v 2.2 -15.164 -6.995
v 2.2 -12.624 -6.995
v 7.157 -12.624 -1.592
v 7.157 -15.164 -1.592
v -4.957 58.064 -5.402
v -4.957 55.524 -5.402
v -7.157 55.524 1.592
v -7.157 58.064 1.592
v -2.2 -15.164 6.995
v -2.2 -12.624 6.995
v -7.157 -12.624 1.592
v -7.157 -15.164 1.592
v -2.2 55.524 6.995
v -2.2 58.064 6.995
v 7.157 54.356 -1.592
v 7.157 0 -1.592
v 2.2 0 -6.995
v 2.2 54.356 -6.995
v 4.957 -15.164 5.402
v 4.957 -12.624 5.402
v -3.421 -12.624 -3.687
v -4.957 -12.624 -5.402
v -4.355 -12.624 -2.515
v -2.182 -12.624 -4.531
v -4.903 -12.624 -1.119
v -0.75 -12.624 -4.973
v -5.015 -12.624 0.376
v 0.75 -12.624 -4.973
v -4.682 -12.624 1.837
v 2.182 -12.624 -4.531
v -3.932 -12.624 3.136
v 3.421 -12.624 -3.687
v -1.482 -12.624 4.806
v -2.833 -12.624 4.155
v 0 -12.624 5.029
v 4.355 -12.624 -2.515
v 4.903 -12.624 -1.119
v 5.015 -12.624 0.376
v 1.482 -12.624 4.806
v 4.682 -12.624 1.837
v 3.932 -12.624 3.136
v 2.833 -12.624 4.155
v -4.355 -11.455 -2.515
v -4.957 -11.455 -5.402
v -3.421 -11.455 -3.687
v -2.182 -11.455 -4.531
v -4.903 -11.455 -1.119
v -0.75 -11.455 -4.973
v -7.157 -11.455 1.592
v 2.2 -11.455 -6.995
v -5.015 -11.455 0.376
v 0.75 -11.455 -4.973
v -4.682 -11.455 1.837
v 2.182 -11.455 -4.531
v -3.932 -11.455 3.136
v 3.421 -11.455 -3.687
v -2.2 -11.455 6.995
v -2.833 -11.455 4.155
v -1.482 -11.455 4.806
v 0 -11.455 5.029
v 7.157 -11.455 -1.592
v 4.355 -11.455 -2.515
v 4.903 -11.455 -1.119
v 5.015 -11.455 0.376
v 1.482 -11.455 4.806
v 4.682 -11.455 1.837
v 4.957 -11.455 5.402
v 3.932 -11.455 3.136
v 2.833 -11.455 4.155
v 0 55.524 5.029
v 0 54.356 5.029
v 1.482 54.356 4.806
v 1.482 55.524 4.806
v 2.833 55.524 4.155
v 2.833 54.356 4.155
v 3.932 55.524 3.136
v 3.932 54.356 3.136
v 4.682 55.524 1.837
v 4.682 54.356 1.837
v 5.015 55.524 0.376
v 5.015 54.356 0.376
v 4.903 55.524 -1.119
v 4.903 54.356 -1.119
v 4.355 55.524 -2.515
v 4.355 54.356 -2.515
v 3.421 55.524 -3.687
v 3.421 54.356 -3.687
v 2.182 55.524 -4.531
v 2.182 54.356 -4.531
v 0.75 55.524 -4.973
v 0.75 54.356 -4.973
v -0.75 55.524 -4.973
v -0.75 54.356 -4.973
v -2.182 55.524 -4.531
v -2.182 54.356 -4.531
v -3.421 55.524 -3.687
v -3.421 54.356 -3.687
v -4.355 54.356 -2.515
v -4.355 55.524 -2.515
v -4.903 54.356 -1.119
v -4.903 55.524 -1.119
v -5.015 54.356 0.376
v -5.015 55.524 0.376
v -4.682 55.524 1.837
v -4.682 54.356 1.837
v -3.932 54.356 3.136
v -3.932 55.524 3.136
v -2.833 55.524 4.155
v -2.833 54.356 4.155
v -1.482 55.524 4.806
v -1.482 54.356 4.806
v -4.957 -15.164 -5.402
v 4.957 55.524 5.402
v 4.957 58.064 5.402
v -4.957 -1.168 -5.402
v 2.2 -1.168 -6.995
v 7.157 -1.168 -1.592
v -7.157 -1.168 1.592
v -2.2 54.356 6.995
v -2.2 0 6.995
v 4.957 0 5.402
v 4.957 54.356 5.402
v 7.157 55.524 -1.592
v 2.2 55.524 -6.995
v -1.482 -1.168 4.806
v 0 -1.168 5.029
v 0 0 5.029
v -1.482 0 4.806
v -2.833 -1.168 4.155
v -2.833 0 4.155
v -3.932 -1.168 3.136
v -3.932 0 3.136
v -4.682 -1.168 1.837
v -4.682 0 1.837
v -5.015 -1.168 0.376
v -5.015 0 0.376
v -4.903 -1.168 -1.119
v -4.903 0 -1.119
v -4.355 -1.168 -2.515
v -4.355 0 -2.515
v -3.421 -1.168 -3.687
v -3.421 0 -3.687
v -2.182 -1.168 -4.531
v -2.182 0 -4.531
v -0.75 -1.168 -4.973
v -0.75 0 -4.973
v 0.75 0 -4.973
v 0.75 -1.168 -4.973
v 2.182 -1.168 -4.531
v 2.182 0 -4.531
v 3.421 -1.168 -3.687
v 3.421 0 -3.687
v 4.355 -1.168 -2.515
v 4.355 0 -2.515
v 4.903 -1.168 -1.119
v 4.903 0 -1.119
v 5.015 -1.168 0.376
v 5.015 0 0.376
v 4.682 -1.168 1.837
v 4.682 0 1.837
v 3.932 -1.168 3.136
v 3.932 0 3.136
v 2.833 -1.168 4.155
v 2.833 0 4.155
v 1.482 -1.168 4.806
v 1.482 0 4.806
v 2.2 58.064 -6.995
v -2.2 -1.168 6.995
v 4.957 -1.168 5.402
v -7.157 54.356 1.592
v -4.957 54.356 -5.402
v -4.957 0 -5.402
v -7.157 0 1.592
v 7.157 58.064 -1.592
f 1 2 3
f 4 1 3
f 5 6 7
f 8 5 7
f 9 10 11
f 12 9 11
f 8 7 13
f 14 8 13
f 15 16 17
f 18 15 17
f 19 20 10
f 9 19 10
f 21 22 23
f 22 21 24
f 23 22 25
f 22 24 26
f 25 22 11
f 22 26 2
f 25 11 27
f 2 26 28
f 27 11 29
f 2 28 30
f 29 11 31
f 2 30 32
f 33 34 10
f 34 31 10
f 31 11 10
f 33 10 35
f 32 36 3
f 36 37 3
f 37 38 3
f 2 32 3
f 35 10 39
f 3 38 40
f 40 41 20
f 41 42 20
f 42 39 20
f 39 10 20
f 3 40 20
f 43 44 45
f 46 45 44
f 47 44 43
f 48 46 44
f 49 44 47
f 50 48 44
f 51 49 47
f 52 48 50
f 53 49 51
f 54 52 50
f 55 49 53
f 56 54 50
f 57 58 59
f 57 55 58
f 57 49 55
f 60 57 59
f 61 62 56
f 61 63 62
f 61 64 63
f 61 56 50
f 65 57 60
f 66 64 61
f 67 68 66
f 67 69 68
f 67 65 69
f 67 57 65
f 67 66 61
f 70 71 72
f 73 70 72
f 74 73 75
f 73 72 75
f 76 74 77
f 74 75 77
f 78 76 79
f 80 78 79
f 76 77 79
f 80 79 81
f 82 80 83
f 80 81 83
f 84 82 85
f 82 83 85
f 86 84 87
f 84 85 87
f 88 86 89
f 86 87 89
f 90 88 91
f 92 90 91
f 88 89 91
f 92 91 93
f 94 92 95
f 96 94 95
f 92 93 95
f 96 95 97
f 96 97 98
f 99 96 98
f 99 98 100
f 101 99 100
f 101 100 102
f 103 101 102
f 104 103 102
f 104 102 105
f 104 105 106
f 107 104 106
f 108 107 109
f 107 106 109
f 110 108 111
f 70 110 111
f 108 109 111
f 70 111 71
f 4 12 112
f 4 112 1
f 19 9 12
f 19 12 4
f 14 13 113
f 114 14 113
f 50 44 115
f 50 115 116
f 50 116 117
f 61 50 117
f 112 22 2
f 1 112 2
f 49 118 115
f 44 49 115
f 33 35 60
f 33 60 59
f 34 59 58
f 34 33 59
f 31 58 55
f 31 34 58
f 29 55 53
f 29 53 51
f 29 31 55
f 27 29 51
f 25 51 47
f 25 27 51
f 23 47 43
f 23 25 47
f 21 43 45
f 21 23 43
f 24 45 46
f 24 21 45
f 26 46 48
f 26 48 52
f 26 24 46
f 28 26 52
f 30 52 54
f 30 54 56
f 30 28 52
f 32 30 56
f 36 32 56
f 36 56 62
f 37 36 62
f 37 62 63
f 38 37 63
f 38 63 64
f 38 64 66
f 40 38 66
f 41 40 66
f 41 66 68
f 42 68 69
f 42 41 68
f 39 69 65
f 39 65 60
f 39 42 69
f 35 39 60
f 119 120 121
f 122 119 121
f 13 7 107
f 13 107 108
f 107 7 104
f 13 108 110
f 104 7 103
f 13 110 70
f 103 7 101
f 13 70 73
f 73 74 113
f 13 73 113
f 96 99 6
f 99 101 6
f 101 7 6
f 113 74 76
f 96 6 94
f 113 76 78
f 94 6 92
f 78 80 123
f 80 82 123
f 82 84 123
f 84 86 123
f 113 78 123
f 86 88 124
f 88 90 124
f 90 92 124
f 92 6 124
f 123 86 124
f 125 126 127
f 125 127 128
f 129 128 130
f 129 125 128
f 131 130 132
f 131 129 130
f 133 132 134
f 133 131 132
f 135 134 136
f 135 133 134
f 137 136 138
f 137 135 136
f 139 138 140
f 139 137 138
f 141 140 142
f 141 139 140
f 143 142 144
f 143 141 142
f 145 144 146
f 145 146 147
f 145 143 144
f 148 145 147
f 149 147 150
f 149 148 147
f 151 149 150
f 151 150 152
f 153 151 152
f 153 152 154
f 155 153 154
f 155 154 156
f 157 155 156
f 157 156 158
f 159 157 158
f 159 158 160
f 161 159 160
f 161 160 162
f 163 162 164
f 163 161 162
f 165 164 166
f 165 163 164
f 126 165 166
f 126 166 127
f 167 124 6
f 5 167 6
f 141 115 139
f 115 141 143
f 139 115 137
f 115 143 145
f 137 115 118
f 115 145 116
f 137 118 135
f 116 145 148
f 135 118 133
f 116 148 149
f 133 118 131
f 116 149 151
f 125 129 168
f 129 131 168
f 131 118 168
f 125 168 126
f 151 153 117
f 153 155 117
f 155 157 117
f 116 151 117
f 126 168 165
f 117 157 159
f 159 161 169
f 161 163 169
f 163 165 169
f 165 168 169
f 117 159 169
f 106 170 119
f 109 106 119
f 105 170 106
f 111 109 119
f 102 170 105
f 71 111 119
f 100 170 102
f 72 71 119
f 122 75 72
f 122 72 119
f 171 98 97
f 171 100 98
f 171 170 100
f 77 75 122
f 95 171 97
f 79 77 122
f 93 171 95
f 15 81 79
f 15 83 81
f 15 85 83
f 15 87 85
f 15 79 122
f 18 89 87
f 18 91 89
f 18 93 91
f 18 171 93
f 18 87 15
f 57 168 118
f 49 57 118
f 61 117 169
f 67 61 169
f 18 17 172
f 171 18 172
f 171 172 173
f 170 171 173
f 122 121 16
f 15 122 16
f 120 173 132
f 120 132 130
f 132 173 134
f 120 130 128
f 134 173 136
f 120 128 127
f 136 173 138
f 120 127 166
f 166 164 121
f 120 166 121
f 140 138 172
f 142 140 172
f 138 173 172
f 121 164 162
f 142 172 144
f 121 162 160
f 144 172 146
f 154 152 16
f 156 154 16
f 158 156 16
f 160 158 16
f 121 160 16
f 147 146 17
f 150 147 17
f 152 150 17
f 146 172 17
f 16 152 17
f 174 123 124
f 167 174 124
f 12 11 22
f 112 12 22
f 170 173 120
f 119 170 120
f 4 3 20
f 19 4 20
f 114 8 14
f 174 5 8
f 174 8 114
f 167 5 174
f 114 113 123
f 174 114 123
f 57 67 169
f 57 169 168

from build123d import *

# Parameters (mm, degrees)
BOSS_EXTRUDE1_DEPTH = 54.356
SKETCH2_R           = 5.0292
BOSS_EXTRUDE2_DEPTH = 1.1684
BOSS_EXTRUDE3_DEPTH = 2.54
BOSS_EXTRUDE4_START = 1.1684
SKETCH4_R           = 5.0292
BOSS_EXTRUDE4_DEPTH = 1.1684
BOSS_EXTRUDE5_DEPTH = 10.287
BOSS_EXTRUDE6_START = 1.1684
SKETCH6_R           = 5.0292
BOSS_EXTRUDE6_DEPTH = 1.1684
BOSS_EXTRUDE7_DEPTH = 2.54


with BuildPart() as part:
    # Sketch1 → Boss-Extrude1 (new body)
    with BuildSketch(Plane(origin=(0, 0, 0), x_dir=(1, 0, 0), z_dir=(0, 1, 0))):
        Polygon((4.957467016, -5.40248592), (7.157423558, 1.592049415), (2.199956542, 6.994535335), (-4.957467016, 5.40248592), (-7.157423558, -1.592049415), (-2.199956542, -6.994535335), align=None)
    extrude(amount=BOSS_EXTRUDE1_DEPTH)

    # Sketch2 → Boss-Extrude2 (add)
    with BuildSketch(Plane(origin=(0, 54.356, 0), x_dir=(1, 0, 0), z_dir=(0, 1, 0))):
        with Locations(Location((0, 0, 0), (0, 0, 270))):
            Circle(SKETCH2_R)
    extrude(amount=BOSS_EXTRUDE2_DEPTH)

    # Sketch3 → Boss-Extrude3 (add)
    with BuildSketch(Plane(origin=(0, 55.5244, 0), x_dir=(1, 0, 0), z_dir=(0, 1, 0))):
        Polygon((-2.199956542, -6.994535335), (4.957467016, -5.40248592), (7.157423558, 1.592049415), (2.199956542, 6.994535335), (-4.957467016, 5.40248592), (-7.157423558, -1.592049415), align=None)
    extrude(amount=BOSS_EXTRUDE3_DEPTH)

    # Sketch4 → Boss-Extrude4 (add)
    with BuildSketch(Plane.XZ.offset(BOSS_EXTRUDE4_START)):
        with Locations(Location((0, 0, 0), (0, 0, 90))):
            Circle(SKETCH4_R)
    extrude(amount=-BOSS_EXTRUDE4_DEPTH)

    # Sketch5 → Boss-Extrude5 (add)
    with BuildSketch(Plane.XZ.offset(1.1684)):
        Polygon((4.957467016, 5.40248592), (-2.199956542, 6.994535335), (-7.157423558, 1.592049415), (-4.957467016, -5.40248592), (2.199956542, -6.994535335), (7.157423558, -1.592049415), align=None)
    extrude(amount=BOSS_EXTRUDE5_DEPTH)

    # Sketch6 → Boss-Extrude6 (add)
    with BuildSketch(Plane.XZ.offset(11.4554).offset(BOSS_EXTRUDE6_START)):
        with Locations(Location((0, 0, 0), (0, 0, 90))):
            Circle(SKETCH6_R)
    extrude(amount=-BOSS_EXTRUDE6_DEPTH)

    # Sketch7 → Boss-Extrude7 (add)
    with BuildSketch(Plane.XZ.offset(12.6238)):
        Polygon((7.157423558, -1.592049415), (4.957467016, 5.40248592), (-2.199956542, 6.994535335), (-7.157423558, 1.592049415), (-4.957467016, -5.40248592), (2.199956542, -6.994535335), align=None)
    extrude(amount=BOSS_EXTRUDE7_DEPTH)


solid = part.part
